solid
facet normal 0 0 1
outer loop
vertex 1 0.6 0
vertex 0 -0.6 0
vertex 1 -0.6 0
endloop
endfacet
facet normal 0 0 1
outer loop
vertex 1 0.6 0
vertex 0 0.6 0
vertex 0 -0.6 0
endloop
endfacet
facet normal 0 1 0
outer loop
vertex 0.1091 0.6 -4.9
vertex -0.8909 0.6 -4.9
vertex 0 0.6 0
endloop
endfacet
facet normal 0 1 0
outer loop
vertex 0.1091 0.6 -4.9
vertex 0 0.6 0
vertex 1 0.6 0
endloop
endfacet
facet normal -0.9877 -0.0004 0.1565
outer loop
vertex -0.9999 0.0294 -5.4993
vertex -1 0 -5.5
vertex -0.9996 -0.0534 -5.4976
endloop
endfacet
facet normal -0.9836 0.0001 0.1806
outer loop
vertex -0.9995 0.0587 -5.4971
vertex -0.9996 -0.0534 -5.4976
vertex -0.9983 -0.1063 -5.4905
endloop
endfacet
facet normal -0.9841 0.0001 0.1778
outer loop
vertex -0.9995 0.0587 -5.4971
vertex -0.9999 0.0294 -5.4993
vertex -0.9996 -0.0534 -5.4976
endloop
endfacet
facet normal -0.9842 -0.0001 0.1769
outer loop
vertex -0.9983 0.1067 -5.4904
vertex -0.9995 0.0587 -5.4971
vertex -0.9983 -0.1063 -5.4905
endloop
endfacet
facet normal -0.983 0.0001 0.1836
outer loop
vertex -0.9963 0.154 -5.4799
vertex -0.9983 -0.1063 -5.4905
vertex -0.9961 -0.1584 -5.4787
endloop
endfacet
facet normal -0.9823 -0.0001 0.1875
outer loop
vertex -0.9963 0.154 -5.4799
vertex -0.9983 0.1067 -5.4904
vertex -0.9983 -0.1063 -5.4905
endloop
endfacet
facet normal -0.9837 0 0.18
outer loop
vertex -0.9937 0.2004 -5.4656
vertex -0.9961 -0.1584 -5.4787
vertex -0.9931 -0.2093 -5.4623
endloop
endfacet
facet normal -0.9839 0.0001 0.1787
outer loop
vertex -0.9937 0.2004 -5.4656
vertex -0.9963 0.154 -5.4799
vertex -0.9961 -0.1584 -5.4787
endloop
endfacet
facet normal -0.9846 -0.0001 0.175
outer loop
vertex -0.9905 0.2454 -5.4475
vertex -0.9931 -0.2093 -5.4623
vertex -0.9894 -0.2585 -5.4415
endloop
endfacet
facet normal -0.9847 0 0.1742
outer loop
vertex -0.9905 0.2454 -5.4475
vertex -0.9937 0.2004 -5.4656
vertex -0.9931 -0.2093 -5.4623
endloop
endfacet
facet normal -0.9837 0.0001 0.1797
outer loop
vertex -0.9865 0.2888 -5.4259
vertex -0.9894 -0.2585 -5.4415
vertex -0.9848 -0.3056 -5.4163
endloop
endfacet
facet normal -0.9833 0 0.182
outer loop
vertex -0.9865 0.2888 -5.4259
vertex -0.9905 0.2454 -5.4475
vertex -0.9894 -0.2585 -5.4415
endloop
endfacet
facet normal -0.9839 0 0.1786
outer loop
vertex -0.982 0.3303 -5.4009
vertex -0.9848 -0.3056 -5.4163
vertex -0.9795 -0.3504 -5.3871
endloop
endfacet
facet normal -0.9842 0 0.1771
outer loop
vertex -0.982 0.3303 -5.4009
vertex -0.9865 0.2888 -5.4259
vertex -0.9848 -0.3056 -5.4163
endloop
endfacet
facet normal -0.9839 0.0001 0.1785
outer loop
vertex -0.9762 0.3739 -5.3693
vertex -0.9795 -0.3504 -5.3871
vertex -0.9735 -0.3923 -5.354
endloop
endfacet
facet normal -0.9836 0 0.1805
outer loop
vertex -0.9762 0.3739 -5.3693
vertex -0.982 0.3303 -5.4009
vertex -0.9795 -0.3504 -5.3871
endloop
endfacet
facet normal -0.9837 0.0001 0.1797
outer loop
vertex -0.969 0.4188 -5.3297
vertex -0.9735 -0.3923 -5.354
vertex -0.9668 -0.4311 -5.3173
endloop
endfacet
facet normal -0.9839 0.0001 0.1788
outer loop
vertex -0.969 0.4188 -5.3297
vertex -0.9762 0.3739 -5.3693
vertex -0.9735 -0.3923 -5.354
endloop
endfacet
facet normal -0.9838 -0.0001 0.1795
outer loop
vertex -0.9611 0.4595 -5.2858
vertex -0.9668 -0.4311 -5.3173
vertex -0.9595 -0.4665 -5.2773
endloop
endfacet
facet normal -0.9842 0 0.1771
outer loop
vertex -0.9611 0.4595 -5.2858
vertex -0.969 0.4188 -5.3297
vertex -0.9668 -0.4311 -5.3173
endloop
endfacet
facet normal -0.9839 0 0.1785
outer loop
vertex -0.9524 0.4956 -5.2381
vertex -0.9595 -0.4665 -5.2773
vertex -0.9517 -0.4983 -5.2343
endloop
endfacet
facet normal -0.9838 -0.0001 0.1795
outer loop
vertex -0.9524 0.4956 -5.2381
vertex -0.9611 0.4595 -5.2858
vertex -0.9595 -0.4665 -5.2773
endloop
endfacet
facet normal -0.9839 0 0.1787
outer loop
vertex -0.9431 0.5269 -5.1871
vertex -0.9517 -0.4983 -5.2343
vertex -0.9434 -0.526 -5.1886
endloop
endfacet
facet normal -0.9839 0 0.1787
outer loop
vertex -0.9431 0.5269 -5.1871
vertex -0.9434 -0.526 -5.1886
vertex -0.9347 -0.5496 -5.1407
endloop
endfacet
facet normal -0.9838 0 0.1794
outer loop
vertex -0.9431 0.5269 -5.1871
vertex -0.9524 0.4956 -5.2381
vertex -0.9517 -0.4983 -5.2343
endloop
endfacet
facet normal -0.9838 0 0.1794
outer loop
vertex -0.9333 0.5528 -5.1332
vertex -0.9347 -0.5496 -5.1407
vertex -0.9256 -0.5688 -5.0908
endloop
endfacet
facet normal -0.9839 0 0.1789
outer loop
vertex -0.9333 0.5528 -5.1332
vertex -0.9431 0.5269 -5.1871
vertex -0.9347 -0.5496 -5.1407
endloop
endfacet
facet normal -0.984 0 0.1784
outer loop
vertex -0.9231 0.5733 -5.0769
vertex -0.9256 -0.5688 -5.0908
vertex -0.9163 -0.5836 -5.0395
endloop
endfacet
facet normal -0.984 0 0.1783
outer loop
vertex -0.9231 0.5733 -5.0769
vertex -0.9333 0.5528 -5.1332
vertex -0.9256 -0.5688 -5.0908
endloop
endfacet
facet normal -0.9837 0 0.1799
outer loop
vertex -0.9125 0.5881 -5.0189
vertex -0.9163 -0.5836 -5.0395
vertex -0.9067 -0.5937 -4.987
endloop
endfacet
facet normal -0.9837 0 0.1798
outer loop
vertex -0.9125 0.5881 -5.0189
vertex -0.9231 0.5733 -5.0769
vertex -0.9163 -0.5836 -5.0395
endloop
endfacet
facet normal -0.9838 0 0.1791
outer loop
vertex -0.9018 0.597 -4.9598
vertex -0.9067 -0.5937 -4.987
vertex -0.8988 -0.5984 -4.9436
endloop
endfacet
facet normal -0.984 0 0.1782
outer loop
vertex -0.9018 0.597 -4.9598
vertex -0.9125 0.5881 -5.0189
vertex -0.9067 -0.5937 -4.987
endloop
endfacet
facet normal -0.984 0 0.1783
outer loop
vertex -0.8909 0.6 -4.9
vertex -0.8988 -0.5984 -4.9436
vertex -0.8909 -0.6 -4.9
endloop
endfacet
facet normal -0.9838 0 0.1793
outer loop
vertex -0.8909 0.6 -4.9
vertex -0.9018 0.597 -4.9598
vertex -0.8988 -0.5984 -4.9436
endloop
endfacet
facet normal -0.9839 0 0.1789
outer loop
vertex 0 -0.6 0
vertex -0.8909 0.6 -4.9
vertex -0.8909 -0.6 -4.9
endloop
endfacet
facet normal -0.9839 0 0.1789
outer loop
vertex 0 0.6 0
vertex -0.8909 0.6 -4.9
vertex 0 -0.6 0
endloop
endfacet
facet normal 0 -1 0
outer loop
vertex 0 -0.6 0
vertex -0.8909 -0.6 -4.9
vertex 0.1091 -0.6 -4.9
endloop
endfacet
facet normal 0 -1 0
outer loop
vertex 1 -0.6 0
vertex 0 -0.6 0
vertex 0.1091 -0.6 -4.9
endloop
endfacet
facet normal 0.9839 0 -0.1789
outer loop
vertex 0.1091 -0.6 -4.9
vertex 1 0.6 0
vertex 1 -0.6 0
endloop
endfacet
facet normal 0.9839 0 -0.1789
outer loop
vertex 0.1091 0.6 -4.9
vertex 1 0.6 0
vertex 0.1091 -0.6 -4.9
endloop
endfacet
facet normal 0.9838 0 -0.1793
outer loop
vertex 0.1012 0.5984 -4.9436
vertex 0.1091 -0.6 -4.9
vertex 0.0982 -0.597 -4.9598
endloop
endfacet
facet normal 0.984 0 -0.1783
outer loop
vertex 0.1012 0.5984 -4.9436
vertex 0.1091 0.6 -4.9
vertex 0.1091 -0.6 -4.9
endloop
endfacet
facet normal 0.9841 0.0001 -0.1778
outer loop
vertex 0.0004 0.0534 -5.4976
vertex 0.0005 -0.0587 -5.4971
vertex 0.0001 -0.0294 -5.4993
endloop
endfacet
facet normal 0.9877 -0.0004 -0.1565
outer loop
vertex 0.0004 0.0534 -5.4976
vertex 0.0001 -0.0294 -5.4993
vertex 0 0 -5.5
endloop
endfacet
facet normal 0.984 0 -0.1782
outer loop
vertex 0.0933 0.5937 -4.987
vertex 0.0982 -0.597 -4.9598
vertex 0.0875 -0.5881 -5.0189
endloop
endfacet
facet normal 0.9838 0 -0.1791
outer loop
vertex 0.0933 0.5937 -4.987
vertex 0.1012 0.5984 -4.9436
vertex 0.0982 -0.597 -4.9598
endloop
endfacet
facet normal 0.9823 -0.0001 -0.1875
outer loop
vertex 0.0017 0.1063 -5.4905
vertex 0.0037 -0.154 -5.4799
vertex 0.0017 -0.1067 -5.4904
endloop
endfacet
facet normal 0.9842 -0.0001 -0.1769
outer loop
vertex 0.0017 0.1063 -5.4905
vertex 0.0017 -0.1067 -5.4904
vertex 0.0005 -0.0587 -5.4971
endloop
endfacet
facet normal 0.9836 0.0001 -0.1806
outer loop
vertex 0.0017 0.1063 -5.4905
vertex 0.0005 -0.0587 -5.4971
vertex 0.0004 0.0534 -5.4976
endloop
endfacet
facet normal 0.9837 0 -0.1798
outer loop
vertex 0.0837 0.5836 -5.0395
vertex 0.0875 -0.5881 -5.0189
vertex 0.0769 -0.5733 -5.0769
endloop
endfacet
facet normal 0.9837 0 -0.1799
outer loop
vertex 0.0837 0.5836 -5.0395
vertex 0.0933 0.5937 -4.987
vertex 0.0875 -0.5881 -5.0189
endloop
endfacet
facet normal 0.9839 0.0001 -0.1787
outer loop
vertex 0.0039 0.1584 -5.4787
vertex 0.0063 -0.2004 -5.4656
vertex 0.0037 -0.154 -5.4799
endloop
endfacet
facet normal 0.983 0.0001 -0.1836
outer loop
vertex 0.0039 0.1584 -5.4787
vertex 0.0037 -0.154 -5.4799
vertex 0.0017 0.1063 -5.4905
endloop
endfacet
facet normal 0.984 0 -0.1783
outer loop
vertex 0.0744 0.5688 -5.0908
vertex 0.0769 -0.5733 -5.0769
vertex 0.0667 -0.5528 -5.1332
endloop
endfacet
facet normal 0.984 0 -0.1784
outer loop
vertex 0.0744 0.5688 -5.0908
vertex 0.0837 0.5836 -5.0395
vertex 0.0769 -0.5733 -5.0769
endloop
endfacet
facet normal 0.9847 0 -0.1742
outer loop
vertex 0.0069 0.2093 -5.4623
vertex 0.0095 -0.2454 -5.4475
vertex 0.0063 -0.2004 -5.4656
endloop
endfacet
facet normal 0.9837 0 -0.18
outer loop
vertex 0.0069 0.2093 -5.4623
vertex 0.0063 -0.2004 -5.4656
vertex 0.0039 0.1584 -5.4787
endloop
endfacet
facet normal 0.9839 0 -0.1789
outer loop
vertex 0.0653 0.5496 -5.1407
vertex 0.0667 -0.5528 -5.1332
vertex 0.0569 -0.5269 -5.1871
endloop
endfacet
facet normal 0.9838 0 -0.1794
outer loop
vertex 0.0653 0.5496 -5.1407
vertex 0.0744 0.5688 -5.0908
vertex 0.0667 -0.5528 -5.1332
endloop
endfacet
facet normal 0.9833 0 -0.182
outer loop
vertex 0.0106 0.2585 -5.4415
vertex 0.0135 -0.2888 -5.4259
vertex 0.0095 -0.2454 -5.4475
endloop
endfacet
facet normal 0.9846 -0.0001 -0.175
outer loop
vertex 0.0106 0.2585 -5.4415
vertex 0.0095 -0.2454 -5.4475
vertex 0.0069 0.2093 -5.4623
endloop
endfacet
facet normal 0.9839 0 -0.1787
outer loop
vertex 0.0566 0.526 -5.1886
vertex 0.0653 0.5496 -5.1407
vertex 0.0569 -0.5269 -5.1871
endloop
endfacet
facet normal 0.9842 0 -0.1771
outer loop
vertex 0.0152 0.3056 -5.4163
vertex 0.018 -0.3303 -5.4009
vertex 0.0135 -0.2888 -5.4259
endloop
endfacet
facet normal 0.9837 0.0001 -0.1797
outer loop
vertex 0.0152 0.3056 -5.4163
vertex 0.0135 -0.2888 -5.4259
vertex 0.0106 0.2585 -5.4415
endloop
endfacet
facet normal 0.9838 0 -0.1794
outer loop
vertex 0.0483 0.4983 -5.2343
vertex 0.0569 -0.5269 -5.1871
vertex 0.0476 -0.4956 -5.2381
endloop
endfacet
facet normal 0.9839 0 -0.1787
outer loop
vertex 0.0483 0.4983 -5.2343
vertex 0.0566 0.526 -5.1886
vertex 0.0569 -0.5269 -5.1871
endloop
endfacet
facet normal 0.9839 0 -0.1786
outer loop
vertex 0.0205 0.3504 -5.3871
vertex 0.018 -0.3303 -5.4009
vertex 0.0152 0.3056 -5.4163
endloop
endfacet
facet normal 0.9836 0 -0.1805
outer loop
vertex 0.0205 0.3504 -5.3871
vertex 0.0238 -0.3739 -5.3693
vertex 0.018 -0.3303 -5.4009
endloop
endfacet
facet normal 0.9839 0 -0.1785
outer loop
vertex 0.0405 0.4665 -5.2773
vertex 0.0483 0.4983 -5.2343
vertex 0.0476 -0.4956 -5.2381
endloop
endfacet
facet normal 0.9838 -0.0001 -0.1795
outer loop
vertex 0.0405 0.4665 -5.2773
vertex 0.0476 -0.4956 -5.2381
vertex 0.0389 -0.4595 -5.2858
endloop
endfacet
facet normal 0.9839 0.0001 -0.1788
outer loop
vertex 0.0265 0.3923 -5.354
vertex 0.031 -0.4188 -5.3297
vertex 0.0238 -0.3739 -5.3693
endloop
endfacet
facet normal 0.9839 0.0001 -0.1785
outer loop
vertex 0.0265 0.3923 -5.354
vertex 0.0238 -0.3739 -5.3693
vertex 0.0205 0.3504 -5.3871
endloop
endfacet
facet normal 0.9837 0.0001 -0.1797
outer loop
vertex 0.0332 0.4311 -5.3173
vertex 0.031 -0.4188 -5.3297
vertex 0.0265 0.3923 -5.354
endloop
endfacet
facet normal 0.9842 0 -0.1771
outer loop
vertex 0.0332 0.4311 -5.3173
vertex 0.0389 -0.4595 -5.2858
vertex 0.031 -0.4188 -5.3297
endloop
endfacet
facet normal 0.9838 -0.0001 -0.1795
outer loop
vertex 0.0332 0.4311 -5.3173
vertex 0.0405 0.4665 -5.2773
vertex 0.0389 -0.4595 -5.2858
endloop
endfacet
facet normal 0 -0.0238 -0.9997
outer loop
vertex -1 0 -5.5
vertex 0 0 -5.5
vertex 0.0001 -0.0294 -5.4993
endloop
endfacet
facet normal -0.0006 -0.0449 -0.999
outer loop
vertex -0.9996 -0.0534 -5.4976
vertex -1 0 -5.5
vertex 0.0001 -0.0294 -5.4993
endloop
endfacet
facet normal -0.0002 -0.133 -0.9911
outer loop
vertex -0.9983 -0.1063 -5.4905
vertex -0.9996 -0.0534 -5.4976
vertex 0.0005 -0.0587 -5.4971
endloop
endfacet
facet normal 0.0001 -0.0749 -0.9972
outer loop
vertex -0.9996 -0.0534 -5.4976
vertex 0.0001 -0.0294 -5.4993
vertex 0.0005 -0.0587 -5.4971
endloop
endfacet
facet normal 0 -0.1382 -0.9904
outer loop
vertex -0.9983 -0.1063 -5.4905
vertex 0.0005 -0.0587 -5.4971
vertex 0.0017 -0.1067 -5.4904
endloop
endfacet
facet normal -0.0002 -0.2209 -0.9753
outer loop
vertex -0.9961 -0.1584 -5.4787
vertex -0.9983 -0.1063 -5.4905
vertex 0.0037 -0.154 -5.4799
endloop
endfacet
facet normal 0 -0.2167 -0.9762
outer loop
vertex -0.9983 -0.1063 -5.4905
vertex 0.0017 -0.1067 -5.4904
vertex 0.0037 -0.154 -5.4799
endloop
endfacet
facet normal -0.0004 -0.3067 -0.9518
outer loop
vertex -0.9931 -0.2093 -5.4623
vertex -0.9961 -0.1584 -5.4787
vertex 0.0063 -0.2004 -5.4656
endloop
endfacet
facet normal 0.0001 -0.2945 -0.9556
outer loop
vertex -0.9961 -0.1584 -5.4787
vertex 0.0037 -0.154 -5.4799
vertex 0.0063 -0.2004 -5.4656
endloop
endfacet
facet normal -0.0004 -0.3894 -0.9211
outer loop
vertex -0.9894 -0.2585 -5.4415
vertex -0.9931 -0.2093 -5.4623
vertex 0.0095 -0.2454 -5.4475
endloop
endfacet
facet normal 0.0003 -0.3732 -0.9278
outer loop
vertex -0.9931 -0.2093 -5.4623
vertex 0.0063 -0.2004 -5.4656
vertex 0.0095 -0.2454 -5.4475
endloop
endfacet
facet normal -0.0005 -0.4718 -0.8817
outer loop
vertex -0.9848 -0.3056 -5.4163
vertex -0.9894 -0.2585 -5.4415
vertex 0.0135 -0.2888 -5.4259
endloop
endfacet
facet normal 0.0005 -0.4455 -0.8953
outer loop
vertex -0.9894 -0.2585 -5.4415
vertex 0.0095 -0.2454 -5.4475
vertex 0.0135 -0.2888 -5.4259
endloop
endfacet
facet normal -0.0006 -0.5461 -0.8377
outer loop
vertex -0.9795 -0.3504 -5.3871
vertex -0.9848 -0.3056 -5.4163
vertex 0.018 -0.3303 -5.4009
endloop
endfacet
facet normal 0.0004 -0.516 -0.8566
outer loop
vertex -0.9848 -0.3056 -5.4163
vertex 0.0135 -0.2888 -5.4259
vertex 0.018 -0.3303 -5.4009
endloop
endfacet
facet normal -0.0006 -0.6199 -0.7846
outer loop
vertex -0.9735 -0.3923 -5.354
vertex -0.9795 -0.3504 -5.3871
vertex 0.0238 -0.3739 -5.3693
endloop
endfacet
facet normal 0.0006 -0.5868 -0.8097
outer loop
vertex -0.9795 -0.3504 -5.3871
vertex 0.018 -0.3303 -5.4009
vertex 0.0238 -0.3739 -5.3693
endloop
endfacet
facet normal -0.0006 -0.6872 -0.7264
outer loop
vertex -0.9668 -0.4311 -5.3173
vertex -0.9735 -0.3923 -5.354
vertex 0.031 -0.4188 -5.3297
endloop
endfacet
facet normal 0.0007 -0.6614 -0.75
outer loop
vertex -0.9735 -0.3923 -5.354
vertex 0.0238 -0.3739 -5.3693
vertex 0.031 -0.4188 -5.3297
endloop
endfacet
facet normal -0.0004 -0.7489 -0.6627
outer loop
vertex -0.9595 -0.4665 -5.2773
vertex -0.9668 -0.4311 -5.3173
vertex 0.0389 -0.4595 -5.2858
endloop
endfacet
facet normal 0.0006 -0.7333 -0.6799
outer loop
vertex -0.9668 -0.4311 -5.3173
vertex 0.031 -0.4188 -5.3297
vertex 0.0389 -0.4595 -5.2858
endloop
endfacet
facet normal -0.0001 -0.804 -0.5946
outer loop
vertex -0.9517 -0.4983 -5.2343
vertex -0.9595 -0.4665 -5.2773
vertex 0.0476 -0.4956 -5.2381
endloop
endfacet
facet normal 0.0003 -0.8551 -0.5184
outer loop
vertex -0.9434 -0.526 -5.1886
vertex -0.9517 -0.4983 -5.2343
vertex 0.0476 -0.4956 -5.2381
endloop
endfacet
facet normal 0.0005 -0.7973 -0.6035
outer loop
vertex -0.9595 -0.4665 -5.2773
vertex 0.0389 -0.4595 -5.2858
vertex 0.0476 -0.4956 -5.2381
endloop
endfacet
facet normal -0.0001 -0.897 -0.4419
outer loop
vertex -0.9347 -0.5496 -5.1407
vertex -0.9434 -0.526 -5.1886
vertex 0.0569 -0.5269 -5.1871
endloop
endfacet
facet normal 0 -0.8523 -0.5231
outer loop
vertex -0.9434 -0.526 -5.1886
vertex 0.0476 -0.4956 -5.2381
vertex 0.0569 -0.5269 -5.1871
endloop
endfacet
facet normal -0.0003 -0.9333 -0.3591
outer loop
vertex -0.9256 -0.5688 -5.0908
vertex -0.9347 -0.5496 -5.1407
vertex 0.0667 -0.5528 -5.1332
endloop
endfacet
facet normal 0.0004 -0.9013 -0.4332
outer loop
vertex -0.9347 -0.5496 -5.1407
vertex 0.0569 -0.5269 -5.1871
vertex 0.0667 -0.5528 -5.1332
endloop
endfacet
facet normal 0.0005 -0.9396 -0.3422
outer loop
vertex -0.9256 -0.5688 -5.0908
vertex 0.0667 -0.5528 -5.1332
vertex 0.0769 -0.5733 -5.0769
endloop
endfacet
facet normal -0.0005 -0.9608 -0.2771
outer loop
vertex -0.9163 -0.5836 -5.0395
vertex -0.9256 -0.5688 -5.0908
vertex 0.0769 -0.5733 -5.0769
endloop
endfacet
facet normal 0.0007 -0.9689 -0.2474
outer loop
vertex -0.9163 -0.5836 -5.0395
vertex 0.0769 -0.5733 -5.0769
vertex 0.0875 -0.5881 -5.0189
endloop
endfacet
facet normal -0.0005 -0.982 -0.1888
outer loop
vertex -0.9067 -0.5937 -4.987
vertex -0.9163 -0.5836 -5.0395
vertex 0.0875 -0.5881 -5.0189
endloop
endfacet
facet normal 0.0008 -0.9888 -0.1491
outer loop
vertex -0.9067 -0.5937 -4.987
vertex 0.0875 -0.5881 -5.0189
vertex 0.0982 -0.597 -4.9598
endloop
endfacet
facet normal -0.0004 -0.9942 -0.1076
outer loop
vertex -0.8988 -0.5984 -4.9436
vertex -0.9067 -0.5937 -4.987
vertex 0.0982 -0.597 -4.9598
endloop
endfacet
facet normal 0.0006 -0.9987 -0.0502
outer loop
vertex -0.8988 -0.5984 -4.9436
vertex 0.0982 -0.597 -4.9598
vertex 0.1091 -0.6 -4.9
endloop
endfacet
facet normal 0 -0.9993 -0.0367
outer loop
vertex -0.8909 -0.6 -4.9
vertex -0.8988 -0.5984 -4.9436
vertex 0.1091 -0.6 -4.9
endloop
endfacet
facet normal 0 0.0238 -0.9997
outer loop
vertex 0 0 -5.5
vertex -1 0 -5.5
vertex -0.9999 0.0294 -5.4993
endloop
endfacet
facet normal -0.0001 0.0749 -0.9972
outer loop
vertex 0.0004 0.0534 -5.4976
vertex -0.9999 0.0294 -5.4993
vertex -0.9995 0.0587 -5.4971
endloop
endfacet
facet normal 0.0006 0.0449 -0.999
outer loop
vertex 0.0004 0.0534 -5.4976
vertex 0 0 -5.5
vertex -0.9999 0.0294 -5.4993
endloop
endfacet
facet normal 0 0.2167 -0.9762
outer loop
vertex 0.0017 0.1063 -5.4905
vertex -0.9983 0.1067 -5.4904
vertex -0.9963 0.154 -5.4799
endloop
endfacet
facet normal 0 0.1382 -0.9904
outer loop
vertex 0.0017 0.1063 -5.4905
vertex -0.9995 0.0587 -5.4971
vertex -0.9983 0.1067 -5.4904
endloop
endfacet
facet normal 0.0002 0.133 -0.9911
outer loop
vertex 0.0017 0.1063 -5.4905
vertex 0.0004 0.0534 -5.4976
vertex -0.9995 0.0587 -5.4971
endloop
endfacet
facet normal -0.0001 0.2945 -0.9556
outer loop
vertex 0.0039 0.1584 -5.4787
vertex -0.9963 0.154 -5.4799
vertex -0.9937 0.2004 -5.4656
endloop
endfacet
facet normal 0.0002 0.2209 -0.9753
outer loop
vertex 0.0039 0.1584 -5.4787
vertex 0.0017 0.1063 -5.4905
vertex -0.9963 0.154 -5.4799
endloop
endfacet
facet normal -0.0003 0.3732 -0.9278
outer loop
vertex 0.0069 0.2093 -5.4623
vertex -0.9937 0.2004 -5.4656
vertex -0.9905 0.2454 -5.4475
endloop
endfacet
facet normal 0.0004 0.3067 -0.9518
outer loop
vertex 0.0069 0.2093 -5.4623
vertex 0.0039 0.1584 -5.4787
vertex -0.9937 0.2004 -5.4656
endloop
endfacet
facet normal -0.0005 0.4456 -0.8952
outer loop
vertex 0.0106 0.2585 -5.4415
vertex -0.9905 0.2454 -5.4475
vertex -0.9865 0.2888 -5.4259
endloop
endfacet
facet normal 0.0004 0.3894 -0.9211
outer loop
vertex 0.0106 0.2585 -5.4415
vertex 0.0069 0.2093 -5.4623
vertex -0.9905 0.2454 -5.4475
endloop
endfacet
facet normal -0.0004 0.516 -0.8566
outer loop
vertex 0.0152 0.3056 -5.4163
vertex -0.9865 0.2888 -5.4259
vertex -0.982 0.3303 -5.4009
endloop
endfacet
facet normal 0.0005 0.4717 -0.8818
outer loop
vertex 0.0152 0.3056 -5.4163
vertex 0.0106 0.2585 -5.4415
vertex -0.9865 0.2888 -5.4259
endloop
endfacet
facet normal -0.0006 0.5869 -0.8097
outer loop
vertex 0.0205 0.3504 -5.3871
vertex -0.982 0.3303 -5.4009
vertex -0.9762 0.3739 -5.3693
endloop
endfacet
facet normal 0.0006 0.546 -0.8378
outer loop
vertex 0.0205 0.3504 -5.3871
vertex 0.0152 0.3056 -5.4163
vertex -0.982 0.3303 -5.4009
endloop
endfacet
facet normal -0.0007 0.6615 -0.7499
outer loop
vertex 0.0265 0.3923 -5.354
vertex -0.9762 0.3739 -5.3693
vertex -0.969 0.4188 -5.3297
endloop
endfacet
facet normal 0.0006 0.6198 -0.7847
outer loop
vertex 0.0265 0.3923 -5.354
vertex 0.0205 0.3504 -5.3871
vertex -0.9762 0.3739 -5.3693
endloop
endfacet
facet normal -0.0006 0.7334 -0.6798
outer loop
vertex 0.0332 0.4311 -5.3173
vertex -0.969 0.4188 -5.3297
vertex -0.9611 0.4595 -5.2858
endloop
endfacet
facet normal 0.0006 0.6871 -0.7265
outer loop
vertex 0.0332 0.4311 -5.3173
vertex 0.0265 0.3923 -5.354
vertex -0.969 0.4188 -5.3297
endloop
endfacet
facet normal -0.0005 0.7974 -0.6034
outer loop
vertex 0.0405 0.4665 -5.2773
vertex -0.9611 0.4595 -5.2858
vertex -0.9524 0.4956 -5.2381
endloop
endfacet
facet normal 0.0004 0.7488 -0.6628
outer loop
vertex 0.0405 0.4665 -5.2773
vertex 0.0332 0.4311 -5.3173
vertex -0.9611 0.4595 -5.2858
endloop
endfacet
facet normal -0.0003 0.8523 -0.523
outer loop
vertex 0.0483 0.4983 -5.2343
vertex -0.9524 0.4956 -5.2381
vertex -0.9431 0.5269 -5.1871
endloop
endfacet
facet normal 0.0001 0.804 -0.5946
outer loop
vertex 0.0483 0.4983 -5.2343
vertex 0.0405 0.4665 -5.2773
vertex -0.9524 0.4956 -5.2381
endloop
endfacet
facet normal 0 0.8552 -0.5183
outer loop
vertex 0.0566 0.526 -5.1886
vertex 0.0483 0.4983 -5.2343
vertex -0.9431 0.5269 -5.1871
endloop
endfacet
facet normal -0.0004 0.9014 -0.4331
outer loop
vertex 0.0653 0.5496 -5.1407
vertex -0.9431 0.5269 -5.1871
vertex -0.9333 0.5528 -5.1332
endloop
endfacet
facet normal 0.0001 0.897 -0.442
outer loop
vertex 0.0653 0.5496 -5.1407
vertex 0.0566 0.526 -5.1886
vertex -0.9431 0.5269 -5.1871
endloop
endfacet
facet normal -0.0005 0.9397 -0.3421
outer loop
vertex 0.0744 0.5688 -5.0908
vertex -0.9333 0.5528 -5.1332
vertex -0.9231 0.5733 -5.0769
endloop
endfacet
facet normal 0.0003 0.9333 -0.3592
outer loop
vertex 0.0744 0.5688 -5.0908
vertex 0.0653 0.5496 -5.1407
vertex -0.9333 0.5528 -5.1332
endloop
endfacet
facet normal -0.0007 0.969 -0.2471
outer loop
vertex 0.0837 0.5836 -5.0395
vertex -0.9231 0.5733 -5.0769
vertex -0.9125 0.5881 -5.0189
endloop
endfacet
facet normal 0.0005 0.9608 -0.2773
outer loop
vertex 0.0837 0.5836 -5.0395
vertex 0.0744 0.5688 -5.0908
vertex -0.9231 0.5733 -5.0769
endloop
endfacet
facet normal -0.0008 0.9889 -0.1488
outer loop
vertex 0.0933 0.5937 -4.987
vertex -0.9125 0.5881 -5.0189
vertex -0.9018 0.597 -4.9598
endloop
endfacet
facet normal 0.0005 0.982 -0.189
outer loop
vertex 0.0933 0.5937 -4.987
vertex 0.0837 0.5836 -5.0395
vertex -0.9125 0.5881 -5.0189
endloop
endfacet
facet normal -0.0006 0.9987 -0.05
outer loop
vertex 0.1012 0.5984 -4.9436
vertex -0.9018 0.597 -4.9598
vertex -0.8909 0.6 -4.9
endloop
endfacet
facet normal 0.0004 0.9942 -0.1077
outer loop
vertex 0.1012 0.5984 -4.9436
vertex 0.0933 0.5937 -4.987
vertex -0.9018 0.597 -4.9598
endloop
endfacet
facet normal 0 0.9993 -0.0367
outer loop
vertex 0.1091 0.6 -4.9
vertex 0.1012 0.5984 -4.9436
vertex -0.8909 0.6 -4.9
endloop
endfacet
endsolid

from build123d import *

# Parameters (mm, degrees)
BOSS_EXTRUDE1_DEPTH = 0.6
CUT_EXTRUDE1_DEPTH  = 2


with BuildPart() as part:
    # Sketch1 → Boss-Extrude1 (new body, symmetric)
    with BuildSketch(Plane(origin=(0, 0, 0), x_dir=(1, 0, 0), z_dir=(0, 1, 0))):
        Polygon((0, 0), (1, 0), (0, 5.5), (-1, 5.5), align=None)
    extrude(amount=BOSS_EXTRUDE1_DEPTH, both=True)

    # Sketch4 → Cut-Extrude1 (cut, symmetric)
    with BuildSketch(Plane(origin=(0, 0, 0), x_dir=(0, 0, -1), z_dir=(1, 0, 0))):
        with BuildLine():
            Line((4.9, -0.6), (5.5, -0.6))
            Line((5.5, -0.6), (5.5, 0))
            ThreePointArc((5.5, 0), (5.324264069, -0.424264069), (4.9, -0.6))
        make_face()
    cut_extrude1 = extrude(amount=CUT_EXTRUDE1_DEPTH, both=True, mode=Mode.SUBTRACT)

    # Mirror1: Cut-Extrude1 across plane
    add(cut_extrude1.mirror(Plane.ZX), mode=Mode.SUBTRACT)


solid = part.part
